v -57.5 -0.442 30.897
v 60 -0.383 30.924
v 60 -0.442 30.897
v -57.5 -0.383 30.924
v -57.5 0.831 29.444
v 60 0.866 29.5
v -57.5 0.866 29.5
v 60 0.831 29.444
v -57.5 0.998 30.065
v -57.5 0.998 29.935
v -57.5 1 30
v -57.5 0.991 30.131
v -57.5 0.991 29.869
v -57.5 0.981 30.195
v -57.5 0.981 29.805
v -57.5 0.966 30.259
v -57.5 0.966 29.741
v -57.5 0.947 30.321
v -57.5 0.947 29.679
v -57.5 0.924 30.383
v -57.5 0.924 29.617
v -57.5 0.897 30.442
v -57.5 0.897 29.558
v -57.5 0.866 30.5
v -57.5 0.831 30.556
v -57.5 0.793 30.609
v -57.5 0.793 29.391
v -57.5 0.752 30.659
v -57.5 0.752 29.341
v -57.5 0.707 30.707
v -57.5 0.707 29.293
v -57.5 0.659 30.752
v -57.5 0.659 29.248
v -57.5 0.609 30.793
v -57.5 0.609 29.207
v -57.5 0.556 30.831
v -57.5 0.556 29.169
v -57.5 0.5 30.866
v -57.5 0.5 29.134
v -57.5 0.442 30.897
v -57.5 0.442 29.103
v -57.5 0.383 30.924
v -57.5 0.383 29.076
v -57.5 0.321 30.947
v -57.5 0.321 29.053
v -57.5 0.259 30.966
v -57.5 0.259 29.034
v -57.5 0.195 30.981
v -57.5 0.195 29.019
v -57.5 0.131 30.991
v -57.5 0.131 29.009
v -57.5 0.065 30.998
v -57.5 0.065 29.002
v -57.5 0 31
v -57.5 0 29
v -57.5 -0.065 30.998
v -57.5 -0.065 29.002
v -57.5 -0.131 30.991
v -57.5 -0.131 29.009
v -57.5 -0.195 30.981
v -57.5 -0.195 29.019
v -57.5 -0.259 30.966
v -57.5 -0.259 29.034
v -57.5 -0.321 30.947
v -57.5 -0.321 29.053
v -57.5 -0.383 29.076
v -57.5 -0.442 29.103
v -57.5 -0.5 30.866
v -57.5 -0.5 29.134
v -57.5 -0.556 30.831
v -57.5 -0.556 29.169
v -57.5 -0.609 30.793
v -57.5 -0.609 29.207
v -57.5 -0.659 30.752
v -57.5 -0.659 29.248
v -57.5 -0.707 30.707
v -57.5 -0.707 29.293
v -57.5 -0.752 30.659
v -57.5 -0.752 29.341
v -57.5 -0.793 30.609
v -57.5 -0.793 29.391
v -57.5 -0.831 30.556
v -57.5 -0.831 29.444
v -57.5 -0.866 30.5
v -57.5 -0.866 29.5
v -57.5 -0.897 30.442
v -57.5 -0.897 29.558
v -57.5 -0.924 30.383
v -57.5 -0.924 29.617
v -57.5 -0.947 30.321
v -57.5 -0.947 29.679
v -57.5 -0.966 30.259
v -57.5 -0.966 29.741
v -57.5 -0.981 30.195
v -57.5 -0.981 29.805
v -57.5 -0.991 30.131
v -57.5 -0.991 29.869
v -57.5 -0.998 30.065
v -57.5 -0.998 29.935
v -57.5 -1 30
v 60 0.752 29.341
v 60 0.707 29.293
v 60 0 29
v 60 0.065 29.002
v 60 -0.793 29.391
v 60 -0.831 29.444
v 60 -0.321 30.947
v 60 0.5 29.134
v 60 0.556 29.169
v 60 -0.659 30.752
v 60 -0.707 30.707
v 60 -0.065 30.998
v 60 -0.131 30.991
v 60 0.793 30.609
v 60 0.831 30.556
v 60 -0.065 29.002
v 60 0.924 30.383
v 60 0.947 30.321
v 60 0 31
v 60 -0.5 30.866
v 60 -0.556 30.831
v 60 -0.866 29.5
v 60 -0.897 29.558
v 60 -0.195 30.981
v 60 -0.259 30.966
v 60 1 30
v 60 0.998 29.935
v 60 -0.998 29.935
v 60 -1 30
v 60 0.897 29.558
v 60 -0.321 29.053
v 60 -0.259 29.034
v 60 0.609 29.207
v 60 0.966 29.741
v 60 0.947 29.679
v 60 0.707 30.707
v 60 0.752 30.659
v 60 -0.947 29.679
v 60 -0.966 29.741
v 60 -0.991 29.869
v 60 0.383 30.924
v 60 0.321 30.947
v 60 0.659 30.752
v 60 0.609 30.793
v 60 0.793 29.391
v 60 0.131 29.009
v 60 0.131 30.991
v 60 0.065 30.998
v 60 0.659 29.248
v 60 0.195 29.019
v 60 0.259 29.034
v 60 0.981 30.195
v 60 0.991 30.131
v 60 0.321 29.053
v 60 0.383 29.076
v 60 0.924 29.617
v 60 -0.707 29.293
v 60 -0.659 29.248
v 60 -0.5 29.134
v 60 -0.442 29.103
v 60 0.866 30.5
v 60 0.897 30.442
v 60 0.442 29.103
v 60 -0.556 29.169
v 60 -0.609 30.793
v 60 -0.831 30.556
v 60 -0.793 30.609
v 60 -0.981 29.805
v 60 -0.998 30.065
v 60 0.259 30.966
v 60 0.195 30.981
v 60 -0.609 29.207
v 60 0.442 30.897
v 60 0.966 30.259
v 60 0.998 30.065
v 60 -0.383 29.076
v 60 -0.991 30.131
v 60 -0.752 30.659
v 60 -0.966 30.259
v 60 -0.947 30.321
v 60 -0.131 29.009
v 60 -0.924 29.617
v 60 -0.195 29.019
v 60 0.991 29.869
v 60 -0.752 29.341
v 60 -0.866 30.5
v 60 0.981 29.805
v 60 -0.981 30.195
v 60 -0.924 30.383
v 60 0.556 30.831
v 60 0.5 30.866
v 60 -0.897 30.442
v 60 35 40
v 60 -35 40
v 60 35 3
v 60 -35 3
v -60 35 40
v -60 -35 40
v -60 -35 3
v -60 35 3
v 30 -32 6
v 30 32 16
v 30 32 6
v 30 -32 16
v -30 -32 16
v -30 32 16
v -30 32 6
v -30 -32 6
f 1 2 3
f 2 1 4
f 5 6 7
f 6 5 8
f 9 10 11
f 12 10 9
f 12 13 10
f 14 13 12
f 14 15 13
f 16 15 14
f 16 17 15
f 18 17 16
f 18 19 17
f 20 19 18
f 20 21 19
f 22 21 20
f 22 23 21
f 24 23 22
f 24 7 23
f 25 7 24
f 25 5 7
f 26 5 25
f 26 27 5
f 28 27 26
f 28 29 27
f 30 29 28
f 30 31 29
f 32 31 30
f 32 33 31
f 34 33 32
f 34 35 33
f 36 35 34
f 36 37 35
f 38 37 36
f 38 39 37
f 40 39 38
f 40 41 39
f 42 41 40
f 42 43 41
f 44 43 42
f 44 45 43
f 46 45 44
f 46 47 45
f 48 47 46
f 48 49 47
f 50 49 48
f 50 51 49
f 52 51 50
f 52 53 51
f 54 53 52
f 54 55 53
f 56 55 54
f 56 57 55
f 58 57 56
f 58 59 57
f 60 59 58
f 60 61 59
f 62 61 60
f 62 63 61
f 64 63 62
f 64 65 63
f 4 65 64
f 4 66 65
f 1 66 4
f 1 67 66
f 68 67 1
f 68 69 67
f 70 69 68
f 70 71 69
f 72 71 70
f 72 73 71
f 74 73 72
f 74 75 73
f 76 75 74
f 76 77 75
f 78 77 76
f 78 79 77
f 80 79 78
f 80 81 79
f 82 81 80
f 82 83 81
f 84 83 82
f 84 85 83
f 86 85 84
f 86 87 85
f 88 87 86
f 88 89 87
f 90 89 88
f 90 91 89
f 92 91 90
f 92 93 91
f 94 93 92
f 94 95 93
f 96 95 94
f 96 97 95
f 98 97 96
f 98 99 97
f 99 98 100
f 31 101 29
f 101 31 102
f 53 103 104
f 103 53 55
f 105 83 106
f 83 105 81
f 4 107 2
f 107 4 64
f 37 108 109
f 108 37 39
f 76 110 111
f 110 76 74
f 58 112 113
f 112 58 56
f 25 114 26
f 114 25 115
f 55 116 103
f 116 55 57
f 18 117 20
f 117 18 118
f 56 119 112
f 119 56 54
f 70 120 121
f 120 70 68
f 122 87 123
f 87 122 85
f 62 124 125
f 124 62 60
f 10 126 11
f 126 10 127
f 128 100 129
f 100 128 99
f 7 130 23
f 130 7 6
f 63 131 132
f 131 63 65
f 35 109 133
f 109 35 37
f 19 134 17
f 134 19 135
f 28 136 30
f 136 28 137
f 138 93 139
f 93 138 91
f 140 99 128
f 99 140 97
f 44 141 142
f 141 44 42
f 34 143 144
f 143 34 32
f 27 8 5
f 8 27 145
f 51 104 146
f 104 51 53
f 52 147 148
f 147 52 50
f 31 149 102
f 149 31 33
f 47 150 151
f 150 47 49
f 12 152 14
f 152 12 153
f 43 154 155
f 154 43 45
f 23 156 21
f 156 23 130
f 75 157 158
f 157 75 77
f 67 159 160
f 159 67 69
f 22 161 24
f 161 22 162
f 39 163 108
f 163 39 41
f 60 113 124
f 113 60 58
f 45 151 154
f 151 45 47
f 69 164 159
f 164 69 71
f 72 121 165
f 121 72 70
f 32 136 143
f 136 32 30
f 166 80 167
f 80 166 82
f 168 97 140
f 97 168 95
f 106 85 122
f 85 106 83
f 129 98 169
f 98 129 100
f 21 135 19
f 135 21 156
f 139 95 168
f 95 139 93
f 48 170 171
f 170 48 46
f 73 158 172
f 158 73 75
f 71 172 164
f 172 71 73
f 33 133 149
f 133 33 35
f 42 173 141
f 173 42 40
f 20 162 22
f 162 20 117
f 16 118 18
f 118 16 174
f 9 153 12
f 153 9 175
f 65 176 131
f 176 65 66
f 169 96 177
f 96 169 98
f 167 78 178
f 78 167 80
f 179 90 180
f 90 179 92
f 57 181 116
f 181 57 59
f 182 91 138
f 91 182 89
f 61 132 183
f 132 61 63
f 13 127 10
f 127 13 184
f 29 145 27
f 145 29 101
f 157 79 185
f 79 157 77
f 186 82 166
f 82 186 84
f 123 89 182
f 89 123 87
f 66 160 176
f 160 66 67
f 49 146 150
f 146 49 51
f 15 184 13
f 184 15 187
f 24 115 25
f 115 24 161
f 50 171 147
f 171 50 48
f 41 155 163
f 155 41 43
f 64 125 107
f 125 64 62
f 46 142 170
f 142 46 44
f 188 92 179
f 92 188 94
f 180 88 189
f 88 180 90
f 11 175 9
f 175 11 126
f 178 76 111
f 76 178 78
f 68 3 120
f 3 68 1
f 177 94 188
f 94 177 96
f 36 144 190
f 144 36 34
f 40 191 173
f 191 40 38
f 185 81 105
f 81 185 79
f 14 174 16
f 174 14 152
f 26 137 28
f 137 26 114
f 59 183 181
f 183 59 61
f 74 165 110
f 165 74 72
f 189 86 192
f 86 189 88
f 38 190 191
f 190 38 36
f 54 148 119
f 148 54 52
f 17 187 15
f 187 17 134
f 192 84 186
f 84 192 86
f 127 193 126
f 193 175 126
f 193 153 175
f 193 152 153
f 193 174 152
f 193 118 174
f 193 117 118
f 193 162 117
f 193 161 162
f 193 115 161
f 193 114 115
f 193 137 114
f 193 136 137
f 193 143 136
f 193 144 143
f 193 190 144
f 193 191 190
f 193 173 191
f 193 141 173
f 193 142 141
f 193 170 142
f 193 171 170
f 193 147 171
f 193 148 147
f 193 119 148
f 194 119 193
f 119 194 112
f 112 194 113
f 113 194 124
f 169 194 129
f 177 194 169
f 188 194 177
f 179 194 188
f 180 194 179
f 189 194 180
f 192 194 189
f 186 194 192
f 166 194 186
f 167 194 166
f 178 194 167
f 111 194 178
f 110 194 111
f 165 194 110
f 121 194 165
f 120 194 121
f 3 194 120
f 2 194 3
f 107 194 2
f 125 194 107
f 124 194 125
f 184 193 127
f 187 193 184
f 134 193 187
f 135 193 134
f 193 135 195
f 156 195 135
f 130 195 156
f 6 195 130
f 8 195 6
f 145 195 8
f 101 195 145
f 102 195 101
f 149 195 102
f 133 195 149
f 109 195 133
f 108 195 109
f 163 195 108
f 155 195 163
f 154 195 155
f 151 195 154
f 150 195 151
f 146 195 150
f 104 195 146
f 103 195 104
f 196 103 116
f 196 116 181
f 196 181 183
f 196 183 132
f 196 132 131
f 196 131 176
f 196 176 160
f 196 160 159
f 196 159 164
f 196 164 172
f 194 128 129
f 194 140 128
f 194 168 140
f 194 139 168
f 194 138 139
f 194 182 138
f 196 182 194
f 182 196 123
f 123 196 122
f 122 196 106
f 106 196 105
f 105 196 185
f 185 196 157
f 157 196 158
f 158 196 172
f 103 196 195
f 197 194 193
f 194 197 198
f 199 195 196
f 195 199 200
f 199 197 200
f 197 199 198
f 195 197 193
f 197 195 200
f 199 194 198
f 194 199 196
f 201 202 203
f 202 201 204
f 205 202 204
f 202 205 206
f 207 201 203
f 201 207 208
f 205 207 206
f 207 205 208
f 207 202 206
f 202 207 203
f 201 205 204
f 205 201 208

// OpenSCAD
// Mini horizontal gel-electrophoresis box - buffer tank
// Print orientation: tank rests on XY plane, open top facing up (+Z)

// ---------------- Parameters ----------------
tank_x      = 120;   // outer length along X (mm)
tank_y      = 70;    // outer width along Y (mm)
tank_h      = 40;    // outer height along Z (mm)

wall        = 3;     // wall thickness (mm)
floor       = 3;     // floor thickness (mm)

platform_x  = 60;    // platform length along X (mm), centred
platform_z  = 13;    // platform top height above inner floor (mm)

hole_d      = 2;     // electrode hole diameter (mm)
hole_y      = 0;     // electrode hole Y position (mm)
hole_z      = 30;    // electrode hole Z position (mm)

eps         = 0.5;   // cutter overshoot past faces (mm)
$fn         = 96;    // curve resolution

// ---------------- Derived ----------------
inner_x = tank_x - 2 * wall;          // inner length
inner_y = tank_y - 2 * wall;          // inner width
inner_h = tank_h - floor;             // inner height (open top)
floor_z = floor;                      // floor bottom height (z = 3)
platform_t = platform_z - floor;      // platform thickness above floor (10)

// ---------------- Model ----------------
difference() {
    // Main tank body
    translate([-tank_x/2, -tank_y/2, floor_z])
        cube([tank_x, tank_y, tank_h - floor]);

    // Central raised platform (spans full inner width Y)
    translate([-platform_x/2, -inner_y/2, floor_z + floor])
        cube([platform_x, inner_y, platform_t]);

    // Horizontal electrode holes through each end wall, along X
    for (sx = [-1, 1])
        translate([sx > 0 ? inner_x/2 - eps : -inner_x/2 - eps, hole_y, hole_z])
            rotate([0, 90, 0])
                cylinder(d = hole_d, h = tank_x + 2*eps);
}
